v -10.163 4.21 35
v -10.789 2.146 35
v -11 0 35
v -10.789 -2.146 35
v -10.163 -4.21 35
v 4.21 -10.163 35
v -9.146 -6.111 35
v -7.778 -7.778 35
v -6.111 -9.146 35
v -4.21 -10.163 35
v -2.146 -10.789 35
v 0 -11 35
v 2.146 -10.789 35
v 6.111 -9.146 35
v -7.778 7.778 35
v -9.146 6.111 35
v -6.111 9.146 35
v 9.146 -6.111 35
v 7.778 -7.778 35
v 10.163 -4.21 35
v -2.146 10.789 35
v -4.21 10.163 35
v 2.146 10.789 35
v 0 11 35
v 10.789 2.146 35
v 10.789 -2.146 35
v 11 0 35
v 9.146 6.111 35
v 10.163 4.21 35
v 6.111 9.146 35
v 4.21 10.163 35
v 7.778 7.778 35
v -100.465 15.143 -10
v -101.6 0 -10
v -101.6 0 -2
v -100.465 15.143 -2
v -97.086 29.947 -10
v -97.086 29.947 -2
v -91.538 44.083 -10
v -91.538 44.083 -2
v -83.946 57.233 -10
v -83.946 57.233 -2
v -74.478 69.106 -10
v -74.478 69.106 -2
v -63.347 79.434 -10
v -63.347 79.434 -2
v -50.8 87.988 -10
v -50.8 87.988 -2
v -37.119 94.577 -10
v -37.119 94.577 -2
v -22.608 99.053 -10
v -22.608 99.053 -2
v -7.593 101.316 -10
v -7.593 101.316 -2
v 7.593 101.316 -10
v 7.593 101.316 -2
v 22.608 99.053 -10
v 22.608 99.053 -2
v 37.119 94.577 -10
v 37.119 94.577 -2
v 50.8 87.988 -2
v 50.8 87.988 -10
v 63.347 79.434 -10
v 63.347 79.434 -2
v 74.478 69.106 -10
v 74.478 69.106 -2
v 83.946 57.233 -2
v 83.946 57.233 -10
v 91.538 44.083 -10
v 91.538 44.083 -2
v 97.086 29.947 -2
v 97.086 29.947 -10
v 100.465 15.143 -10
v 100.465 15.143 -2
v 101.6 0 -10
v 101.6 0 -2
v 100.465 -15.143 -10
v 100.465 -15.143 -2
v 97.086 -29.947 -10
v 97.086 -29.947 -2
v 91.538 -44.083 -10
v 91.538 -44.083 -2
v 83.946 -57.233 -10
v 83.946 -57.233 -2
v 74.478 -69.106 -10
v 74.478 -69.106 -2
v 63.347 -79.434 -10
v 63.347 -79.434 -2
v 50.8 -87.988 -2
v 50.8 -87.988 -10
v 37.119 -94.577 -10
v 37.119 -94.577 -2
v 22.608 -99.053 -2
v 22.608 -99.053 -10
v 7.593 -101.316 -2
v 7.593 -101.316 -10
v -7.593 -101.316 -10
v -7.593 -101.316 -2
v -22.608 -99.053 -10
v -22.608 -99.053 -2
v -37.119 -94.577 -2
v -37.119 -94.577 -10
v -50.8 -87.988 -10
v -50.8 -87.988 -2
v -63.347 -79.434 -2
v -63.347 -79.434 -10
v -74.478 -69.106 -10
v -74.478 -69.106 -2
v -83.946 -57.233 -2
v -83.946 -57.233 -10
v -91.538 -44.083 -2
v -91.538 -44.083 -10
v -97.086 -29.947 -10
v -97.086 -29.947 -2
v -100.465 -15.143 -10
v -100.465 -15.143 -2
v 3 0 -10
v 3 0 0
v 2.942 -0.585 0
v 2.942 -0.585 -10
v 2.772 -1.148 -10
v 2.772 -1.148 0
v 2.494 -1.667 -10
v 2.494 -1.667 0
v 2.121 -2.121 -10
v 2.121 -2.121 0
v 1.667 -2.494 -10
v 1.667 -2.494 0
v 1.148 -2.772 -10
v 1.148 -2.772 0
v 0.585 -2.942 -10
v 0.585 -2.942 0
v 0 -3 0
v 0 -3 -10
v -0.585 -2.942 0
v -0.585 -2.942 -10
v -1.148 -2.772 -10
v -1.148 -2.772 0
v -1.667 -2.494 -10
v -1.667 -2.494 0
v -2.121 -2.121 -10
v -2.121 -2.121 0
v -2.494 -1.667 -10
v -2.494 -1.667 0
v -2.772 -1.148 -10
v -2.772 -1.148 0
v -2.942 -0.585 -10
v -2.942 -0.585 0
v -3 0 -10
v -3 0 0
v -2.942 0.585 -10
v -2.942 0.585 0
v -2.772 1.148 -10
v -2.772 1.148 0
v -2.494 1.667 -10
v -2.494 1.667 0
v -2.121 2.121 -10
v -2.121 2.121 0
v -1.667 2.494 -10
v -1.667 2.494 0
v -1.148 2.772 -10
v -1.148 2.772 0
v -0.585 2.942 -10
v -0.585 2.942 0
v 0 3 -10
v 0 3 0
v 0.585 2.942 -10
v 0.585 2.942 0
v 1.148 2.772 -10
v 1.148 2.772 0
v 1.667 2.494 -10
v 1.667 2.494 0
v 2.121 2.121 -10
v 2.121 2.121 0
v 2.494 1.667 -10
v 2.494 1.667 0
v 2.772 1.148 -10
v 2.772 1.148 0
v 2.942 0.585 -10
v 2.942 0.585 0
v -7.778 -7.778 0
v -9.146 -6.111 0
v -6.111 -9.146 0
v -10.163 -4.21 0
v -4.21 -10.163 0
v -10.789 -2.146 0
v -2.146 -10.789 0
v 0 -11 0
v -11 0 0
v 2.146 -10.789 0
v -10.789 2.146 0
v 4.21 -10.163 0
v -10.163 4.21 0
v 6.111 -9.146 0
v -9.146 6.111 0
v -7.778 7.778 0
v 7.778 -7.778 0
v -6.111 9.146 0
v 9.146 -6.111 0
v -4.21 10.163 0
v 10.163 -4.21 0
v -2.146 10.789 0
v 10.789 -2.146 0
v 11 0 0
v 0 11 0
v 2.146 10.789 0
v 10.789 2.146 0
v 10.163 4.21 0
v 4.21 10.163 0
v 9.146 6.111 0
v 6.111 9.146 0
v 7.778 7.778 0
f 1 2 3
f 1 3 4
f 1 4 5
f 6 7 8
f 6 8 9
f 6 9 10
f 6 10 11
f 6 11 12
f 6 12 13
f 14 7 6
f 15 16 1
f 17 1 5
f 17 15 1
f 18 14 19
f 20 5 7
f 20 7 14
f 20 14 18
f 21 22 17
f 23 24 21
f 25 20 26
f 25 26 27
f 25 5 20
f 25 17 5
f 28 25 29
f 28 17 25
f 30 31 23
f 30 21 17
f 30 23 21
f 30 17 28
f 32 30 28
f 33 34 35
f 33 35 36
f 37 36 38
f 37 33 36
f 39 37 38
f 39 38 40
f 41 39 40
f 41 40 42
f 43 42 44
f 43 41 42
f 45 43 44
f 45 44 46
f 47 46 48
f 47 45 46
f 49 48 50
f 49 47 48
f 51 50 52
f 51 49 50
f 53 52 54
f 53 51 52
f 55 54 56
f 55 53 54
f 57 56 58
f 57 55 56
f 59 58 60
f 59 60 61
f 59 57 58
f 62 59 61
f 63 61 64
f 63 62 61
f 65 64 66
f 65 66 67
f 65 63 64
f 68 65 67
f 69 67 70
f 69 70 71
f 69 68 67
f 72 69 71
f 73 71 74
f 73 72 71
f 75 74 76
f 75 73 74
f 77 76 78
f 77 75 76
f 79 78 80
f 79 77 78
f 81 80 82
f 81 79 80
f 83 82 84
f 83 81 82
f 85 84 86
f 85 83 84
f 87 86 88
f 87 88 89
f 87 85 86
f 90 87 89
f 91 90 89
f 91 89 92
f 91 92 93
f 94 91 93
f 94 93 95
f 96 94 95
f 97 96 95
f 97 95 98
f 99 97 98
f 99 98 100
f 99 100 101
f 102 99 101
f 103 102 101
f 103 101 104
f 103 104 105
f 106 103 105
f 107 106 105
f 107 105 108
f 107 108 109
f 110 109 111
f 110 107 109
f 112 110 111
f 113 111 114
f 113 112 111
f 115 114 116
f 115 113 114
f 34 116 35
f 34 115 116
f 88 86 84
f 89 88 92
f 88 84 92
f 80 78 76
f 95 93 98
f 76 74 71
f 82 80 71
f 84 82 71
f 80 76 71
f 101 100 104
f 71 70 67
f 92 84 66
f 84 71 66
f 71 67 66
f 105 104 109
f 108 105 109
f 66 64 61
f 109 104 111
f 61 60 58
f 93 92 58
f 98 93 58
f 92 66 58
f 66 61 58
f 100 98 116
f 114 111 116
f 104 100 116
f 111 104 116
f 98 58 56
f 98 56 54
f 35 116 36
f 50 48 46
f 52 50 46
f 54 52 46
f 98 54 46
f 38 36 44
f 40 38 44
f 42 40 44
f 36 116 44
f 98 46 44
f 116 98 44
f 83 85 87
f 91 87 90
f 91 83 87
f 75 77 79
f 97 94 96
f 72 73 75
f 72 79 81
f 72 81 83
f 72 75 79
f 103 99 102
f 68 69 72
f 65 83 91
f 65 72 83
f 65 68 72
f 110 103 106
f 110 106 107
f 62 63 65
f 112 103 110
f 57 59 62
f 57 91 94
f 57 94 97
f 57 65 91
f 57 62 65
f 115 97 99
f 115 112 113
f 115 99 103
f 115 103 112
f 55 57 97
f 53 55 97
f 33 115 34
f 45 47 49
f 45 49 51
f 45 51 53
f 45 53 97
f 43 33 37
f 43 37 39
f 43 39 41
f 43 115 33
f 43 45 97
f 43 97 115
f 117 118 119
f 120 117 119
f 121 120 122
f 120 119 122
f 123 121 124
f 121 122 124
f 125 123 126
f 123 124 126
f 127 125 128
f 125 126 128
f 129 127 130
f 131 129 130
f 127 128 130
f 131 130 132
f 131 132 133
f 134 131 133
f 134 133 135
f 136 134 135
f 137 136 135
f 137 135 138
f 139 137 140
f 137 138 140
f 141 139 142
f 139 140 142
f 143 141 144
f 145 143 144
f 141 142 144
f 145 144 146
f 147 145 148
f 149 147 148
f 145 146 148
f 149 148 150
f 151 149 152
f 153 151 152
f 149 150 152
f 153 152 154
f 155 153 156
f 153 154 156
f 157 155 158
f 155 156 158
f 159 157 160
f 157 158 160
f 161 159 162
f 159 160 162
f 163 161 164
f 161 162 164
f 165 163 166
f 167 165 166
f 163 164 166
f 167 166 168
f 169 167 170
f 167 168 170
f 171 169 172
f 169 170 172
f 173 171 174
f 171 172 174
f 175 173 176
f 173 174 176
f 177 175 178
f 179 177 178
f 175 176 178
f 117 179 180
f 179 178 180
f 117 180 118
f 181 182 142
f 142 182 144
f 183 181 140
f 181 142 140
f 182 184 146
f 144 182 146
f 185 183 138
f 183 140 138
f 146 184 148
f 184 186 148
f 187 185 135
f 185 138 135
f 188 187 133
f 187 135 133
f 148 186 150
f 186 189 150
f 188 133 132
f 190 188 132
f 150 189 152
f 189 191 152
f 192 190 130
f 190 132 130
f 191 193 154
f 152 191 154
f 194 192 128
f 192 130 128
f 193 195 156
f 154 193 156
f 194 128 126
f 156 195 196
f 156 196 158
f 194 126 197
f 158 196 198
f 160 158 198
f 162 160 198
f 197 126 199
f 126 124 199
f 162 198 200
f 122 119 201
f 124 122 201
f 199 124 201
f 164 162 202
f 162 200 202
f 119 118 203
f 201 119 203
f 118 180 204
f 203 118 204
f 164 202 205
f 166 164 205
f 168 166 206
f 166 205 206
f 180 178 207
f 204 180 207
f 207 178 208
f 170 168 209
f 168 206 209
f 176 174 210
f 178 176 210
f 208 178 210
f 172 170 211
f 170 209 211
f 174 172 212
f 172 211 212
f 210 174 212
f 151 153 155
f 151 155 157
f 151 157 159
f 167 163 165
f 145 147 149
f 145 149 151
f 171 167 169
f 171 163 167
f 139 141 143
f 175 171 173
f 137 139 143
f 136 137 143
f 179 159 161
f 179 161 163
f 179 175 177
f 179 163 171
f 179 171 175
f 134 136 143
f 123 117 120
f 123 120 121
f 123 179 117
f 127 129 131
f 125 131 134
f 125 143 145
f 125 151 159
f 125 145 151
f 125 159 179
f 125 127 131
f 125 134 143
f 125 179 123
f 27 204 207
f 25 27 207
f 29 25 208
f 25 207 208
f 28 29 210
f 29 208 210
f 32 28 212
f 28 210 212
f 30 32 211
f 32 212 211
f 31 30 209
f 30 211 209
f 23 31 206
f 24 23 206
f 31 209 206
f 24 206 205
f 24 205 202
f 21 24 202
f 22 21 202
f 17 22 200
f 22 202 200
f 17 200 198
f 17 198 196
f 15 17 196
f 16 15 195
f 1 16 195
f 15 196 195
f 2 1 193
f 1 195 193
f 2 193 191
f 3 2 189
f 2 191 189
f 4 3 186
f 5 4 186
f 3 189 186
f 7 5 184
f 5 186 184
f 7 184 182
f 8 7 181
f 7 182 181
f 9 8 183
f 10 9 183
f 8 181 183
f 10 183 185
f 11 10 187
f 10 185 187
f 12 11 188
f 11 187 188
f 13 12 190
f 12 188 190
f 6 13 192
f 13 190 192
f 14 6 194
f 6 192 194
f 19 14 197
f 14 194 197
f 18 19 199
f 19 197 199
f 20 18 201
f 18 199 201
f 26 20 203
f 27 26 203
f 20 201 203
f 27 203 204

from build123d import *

# Parameters (mm, degrees)
SKETCH_1_R      = 11
EXTRUDE_1_DEPTH = 35
SKETCH_2_R      = 3
EXTRUDE_2_DEPTH = 10
SKETCH_3_R      = 101.6
EXTRUDE_3_DEPTH = 8


with BuildPart() as part:
    # 草图1 → 拉伸1 (new body)
    with BuildSketch(Plane.XY):
        Circle(SKETCH_1_R)
    extrude(amount=EXTRUDE_1_DEPTH)

    # 草图2 → 拉伸2 (add)
    with BuildSketch(Plane(origin=(0, 0, 0), x_dir=(-1, 0, 0), z_dir=(0, 0, -1))):
        with Locations(Location((0, 0, 0), (0, 0, 180))):
            Circle(SKETCH_2_R)
    extrude(amount=EXTRUDE_2_DEPTH)


with BuildPart() as body_2:
    # 草图3 → 拉伸3 (new body)
    with BuildSketch(Plane(origin=(0, 0, -10), x_dir=(-1, 0, 0), z_dir=(0, 0, -1))):
        Circle(SKETCH_3_R)
    extrude(amount=-EXTRUDE_3_DEPTH)


solid = Compound([part.part, body_2.part])
